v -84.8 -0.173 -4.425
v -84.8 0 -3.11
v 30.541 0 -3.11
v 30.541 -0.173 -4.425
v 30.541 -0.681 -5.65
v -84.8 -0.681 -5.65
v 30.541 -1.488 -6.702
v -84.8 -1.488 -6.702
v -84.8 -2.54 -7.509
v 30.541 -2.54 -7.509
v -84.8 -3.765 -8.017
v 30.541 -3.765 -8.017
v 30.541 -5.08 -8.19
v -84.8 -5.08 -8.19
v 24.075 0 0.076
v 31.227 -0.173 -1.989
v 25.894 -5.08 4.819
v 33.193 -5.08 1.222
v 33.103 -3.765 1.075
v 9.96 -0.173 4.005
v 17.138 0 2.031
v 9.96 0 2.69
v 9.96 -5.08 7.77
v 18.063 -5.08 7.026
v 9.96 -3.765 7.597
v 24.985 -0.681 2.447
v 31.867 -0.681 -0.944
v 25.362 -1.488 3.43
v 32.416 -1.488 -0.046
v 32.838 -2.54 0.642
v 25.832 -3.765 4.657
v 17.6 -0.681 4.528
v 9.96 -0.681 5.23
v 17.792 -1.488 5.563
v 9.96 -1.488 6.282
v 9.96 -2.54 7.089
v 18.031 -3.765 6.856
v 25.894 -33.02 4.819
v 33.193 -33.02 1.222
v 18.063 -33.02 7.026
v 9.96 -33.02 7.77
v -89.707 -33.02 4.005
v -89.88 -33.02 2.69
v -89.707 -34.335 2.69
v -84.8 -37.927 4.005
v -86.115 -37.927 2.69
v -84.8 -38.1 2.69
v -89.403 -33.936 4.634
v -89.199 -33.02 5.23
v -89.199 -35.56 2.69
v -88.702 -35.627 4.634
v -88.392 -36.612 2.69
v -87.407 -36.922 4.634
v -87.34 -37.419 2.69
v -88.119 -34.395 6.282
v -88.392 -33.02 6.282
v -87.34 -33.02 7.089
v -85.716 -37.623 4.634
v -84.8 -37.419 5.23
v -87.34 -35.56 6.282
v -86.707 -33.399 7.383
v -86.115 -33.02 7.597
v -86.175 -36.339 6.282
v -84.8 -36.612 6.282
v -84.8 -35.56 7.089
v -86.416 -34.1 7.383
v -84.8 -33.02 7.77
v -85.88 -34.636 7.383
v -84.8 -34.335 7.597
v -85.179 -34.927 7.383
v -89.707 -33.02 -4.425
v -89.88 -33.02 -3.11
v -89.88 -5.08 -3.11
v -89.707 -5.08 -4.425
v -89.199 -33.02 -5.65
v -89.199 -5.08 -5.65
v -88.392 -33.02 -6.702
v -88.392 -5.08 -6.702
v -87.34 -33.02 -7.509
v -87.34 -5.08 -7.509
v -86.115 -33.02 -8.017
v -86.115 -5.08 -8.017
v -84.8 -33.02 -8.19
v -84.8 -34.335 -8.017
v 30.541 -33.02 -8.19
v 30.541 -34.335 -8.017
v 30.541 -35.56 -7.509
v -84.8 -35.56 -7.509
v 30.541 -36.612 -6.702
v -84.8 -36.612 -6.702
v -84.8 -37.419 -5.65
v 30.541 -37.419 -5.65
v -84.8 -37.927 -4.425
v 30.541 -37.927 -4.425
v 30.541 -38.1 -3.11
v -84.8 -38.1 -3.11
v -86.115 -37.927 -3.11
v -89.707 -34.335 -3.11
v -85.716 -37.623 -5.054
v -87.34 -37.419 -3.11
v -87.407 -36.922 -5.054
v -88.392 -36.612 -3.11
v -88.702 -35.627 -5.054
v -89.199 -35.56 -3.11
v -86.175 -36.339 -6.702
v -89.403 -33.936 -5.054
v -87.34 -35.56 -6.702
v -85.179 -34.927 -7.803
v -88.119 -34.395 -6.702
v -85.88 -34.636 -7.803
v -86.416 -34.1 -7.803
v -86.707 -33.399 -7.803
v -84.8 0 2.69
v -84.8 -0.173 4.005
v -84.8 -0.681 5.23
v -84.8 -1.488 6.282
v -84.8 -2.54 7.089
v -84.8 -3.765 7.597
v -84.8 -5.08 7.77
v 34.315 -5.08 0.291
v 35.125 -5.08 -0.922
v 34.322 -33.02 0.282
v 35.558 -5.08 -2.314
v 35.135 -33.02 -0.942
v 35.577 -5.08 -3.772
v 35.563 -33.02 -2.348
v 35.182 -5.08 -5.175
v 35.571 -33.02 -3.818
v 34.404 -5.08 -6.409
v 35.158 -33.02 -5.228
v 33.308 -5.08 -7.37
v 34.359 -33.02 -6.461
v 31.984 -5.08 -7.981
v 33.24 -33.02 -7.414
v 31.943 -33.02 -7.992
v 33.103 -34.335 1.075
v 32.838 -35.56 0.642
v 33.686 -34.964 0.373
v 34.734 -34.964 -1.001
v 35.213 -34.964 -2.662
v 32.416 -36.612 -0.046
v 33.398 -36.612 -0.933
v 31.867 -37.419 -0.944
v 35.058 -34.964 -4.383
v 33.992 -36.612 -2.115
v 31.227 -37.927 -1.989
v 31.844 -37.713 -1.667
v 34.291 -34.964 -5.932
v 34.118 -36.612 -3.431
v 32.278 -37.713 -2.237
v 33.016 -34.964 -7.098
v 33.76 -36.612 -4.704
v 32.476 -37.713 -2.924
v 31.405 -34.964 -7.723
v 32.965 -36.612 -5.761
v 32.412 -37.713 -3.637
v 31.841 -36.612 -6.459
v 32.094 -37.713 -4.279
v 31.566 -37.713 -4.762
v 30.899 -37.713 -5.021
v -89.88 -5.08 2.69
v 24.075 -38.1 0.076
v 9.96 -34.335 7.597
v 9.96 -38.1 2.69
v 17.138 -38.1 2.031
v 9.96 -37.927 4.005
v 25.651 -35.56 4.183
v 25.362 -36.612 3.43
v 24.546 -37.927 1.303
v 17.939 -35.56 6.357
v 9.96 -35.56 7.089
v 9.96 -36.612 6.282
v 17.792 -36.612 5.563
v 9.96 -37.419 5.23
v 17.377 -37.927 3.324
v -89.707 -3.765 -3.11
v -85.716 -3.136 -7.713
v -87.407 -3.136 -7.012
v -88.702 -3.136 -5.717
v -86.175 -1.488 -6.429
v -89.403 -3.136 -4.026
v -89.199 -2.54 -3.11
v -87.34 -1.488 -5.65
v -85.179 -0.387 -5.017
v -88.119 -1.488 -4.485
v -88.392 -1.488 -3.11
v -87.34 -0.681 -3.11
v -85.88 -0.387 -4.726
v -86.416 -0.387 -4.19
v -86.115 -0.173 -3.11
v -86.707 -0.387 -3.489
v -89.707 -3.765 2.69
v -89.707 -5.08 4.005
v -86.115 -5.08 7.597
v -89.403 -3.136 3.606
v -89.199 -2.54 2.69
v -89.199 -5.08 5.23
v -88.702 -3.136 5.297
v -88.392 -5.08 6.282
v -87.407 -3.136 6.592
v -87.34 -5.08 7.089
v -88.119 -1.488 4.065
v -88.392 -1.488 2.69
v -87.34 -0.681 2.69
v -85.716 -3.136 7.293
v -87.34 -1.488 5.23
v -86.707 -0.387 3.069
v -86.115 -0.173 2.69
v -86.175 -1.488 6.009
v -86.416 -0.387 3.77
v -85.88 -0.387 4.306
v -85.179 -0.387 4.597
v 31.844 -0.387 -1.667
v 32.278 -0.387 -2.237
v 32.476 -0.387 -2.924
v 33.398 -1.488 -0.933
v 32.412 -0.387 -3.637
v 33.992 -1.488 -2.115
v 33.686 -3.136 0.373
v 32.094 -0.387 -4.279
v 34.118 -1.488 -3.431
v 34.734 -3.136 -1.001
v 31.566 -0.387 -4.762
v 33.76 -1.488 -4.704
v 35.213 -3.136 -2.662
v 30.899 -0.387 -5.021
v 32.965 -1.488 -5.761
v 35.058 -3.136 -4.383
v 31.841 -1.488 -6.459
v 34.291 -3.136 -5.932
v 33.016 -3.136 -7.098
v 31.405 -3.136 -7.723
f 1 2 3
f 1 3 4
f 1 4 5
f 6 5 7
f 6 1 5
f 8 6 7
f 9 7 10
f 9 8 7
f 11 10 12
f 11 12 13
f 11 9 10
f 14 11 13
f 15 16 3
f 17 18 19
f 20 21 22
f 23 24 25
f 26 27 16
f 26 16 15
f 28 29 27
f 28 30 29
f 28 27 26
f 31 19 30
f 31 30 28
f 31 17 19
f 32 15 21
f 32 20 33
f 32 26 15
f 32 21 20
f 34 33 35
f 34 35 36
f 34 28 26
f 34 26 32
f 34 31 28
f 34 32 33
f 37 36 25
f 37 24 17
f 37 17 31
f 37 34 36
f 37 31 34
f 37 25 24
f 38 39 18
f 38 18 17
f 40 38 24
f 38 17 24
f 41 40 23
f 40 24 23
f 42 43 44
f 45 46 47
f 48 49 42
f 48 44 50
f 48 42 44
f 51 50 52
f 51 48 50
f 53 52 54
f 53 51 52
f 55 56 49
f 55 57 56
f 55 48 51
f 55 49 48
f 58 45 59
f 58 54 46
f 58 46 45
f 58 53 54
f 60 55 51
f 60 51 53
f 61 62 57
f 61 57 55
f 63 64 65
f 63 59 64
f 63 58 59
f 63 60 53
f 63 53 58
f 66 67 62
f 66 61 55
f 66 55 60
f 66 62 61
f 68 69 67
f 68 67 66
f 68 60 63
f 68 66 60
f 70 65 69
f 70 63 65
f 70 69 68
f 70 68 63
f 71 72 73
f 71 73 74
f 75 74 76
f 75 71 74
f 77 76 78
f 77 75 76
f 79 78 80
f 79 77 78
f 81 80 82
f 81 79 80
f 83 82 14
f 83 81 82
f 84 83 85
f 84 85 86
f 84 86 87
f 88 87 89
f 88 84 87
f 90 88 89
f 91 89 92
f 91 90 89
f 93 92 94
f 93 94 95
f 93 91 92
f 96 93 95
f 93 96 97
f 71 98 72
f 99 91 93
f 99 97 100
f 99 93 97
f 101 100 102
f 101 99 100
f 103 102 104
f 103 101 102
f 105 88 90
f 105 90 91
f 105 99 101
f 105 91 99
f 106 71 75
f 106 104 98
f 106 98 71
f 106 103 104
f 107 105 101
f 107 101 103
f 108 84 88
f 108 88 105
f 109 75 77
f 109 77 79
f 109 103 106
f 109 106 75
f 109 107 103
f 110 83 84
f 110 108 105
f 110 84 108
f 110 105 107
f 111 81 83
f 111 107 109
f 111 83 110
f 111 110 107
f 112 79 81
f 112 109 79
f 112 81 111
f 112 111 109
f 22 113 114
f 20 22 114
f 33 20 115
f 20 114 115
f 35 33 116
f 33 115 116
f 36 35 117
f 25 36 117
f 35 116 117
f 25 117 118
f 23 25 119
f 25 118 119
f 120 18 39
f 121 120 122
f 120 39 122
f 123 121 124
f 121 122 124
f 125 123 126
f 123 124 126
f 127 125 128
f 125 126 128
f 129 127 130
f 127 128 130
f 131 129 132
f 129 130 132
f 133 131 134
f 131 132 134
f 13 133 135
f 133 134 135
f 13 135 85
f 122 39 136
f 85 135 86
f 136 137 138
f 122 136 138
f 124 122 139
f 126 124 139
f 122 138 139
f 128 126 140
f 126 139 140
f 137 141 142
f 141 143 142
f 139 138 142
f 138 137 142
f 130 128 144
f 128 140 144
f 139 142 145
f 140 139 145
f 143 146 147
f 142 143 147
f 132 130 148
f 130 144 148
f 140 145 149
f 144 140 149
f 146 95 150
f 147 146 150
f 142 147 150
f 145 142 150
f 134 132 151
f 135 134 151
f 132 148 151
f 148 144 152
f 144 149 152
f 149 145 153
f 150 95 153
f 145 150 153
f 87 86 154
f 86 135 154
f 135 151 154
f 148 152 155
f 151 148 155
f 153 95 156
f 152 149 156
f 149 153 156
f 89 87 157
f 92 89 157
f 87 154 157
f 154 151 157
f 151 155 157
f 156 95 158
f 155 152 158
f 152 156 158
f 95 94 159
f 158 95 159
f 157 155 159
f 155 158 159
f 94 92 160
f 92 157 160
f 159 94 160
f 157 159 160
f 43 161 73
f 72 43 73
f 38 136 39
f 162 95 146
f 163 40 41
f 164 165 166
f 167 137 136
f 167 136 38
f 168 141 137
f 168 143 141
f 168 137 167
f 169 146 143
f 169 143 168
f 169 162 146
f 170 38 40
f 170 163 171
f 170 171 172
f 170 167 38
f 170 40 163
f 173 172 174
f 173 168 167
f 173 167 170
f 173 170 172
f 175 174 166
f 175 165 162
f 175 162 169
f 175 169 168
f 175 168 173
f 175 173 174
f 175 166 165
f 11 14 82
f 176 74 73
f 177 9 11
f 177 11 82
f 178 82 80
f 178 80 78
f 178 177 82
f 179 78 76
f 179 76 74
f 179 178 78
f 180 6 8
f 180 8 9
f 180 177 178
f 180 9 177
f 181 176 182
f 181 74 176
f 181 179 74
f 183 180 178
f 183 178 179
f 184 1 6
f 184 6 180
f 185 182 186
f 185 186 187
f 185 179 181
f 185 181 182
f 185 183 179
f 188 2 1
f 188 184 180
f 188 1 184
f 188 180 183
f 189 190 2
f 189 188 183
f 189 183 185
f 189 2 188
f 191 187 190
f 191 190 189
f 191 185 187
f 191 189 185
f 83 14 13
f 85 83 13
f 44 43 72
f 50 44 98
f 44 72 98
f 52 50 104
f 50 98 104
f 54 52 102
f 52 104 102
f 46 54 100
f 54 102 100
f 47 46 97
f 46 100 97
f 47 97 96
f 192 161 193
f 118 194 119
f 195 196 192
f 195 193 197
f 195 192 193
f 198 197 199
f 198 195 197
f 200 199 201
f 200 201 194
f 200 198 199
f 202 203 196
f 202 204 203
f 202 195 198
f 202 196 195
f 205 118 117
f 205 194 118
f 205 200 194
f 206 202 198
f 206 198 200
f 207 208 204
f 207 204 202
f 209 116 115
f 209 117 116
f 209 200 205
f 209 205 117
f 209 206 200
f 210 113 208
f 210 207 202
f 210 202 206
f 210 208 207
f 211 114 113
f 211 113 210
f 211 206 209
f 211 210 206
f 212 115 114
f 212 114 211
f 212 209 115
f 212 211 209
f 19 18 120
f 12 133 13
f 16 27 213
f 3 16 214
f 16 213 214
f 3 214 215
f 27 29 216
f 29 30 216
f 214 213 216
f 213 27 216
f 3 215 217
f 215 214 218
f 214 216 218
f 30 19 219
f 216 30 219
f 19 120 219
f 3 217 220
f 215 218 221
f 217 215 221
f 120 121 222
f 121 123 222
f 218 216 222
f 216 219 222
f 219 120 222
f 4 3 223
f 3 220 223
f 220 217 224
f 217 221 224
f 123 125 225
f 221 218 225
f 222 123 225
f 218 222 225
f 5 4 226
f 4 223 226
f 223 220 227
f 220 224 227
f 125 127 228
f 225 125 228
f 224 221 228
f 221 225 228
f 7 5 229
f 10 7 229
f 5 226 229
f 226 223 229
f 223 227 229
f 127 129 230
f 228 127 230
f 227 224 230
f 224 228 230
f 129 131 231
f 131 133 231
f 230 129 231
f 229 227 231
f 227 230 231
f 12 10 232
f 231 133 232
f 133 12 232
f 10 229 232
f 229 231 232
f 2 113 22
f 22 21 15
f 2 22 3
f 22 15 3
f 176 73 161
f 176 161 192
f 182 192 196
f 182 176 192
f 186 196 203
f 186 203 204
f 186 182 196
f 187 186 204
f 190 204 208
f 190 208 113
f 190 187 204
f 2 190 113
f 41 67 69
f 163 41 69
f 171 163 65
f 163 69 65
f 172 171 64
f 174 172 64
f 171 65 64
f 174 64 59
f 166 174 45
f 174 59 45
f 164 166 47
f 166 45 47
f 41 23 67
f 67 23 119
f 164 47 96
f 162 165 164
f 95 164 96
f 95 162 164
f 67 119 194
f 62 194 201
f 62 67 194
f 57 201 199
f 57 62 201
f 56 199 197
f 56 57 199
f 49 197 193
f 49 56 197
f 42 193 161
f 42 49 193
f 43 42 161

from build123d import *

# Parameters (mm, degrees)
F1_DEPTH     = 38.1
F2_R         = 5.08
F3_F1_R      = 5.08
F3_T2_DEPTH  = 94.7599984092
F3_T4_DEPTH  = 115.3407412507
F3_S8_W      = 5.1816
F3_S8_H      = 5.1816
F3_T9_DEPTH  = 5.1816
F3_S14_W     = 5.1816
F3_S14_H     = 5.1816
F3_T15_DEPTH = 5.1816
F3_T19_ANGLE = 31.4774656297
F3_T21_ANGLE = 148.5225343703
F3_T22_DEPTH = 94.7599984092
F3_T24_DEPTH = 115.3407412507
F3_S28_W     = 5.1816
F3_S28_H     = 5.1816
F3_T29_DEPTH = 5.1816
F3_S34_W     = 5.1816
F3_S34_H     = 5.1816
F3_T35_DEPTH = 5.1816
F3_T39_ANGLE = 31.4774656297
F3_T41_ANGLE = 148.5225343703


# Not quite as in the source:
# - a fillet or chamfer that OpenCascade refuses, or shapes differently, is made with other operations: its cross-section is extruded or revolved along the edge and cut away or added


with BuildPart() as f1:
    # F0 (on Front) → F1 (new body)
    with BuildSketch(Plane.XZ):
        with BuildLine():
            Line((9.9600013345, 7.7700004913), (-89.8799970746, 7.7700004913))
            Line((-89.8799970746, 7.7700004913), (-89.8799970746, -8.1900004297))
            Line((-89.8799970746, -8.1900004297), (44.0999977291, -8.1900004297))
            ThreePointArc((44.0999977291, -8.1900004297), (28.8031763803, 3.5829980082), (9.9600013345, 7.7700004913))
        make_face()
    extrude(amount=F1_DEPTH)

    # F2
    f2_edges = [f1.edges().sort_by_distance(p)[0] for p in [
        (-89.879997, -19.05, -8.19),
        (-89.879997, 0, -0.21),
        (-89.879997, -19.05, 7.77),
        (-89.879997, -38.1, -0.21),
    ]]
    fillet(f2_edges, radius=F2_R)

    # F3: fillet of radius 5.08 on 12 edges, made by hand

    # F3_f1
    f3_f1_edges = [f1.edges().sort_by_distance(p)[0] for p in [
        (44.0999977291, -19.05, -8.1900004297),
    ]]
    fillet(f3_f1_edges, radius=F3_F1_R)

    # F3_s3 → F3_t2 (cut)
    with BuildSketch(Plane.YZ.offset(-84.7999970746)):
        with BuildLine():
            ThreePointArc((0, 2.6900004913), (-1.4878975516, 6.2821029397), (-5.08, 7.7700004913))
            Line((-5.08, 7.7700004913), (-5.08, 7.8716004913))
            Line((-5.08, 7.8716004913), (0.1016, 7.8716004913))
            Line((0.1016, 7.8716004913), (0.1016, 2.6900004913))
            Line((0.1016, 2.6900004913), (0, 2.6900004913))
        make_face()
    extrude(amount=F3_T2_DEPTH, mode=Mode.SUBTRACT)

    # F3_s5 → F3_t4 (cut)
    with BuildSketch(Plane.YZ.offset(-84.7999970746)):
        with BuildLine():
            ThreePointArc((0, -3.1100004297), (-1.4878975516, -6.7021028782), (-5.08, -8.1900004297))
            Line((-5.08, -8.1900004297), (-5.08, -8.2916004297))
            Line((-5.08, -8.2916004297), (0.1016, -8.2916004297))
            Line((0.1016, -8.2916004297), (0.1016, -3.1100004297))
            Line((0.1016, -3.1100004297), (0, -3.1100004297))
        make_face()
    extrude(amount=F3_T4_DEPTH, mode=Mode.SUBTRACT)


with BuildPart() as f3_tool7:
    # F3_s8 → F3_t9 (new body)
    with BuildSketch(Plane.XZ.offset(5.08)):
        with Locations((-87.3907970746, 5.2808004913)):
            Rectangle(F3_S8_W, F3_S8_H)
    extrude(amount=-F3_T9_DEPTH)

    # F3_s10 → F3_t11 (revolve, cut)
    with BuildSketch(Plane(origin=(-84.7999970746, -5.08, 2.6900004913), x_dir=(0.7071067812, 0, -0.7071067812), z_dir=(0.7071067812, 0, 0.7071067812))):
        with BuildLine():
            ThreePointArc((0, -5.08), (5.08, 0), (0, 5.08))
            Line((0, 5.08), (0, -5.08))
        make_face()
    revolve(axis=Axis((-84.7999970746, -5.08, 2.6900004913), (0, 1, 0)), mode=Mode.SUBTRACT)


with BuildPart() as f1_1:
    add(f1.part)

    # F3_t6: cut F3_tool7
    add(f3_tool7.part, mode=Mode.SUBTRACT)


with BuildPart() as f3_tool13:
    # F3_s14 → F3_t15 (new body)
    with BuildSketch(Plane.XZ.offset(5.08)):
        with Locations((-87.3907970746, -5.7008004297)):
            Rectangle(F3_S14_W, F3_S14_H)
    extrude(amount=-F3_T15_DEPTH)

    # F3_s16 → F3_t17 (revolve, cut)
    with BuildSketch(Plane(origin=(-84.7999970746, -5.08, -3.1100004297), x_dir=(0.7071067812, 0, 0.7071067812), z_dir=(-0.7071067812, 0, 0.7071067812))):
        with BuildLine():
            ThreePointArc((0, -5.08), (5.08, 0), (0, 5.08))
            Line((0, 5.08), (0, -5.08))
        make_face()
    revolve(axis=Axis((-84.7999970746, -5.08, -3.1100004297), (0, 1, 0)), mode=Mode.SUBTRACT)


with BuildPart() as f1_2:
    add(f1_1.part)

    # F3_t12: cut F3_tool13
    add(f3_tool13.part, mode=Mode.SUBTRACT)

    # F3_s18 → F3_t19 (revolve, cut)
    with BuildSketch(Plane(origin=(23.5986358548, 0, -14.4484990421), x_dir=(0, 1, 0), z_dir=(0.8528455965, 0, -0.5221631818))):
        with BuildLine():
            ThreePointArc((0, 13.2949019826), (-1.4878975516, 16.887004431), (-5.08, 18.3749019826))
            Line((-5.08, 18.3749019826), (-5.08, 18.4765019826))
            Line((-5.08, 18.4765019826), (0.1016, 18.4765019826))
            Line((0.1016, 18.4765019826), (0.1016, 13.2949019826))
            Line((0.1016, 13.2949019826), (0, 13.2949019826))
        make_face()
    revolve(axis=Axis((9.9600013345, 0, -36.7243886458), (0, -1, 0)), revolution_arc=F3_T19_ANGLE, mode=Mode.SUBTRACT)

    # F3_s20 → F3_t21 (revolve, cut)
    with BuildSketch(Plane(origin=(23.5986358548, 0, -14.4484990421), x_dir=(0, 1, 0), z_dir=(-0.8528455965, 0, 0.5221631818))):
        with BuildLine():
            ThreePointArc((0, -13.2949019826), (-1.4878975516, -16.887004431), (-5.08, -18.3749019826))
            Line((-5.08, -18.3749019826), (-5.08, -18.4765019826))
            Line((-5.08, -18.4765019826), (0.1016, -18.4765019826))
            Line((0.1016, -18.4765019826), (0.1016, -13.2949019826))
            Line((0.1016, -13.2949019826), (0, -13.2949019826))
        make_face()
    revolve(axis=Axis((30.5407441761, 0, -3.1100004297), (0, 1, 0)), revolution_arc=F3_T21_ANGLE, mode=Mode.SUBTRACT)

    # F3_s23 → F3_t22 (cut)
    with BuildSketch(Plane.YZ.offset(-84.7999970746)):
        with BuildLine():
            ThreePointArc((-33.02, 7.7700004913), (-36.6121024484, 6.2821029397), (-38.1, 2.6900004913))
            Line((-38.1, 2.6900004913), (-38.2016, 2.6900004913))
            Line((-38.2016, 2.6900004913), (-38.2016, 7.8716004913))
            Line((-38.2016, 7.8716004913), (-33.02, 7.8716004913))
            Line((-33.02, 7.8716004913), (-33.02, 7.7700004913))
        make_face()
    extrude(amount=F3_T22_DEPTH, mode=Mode.SUBTRACT)

    # F3_s25 → F3_t24 (cut)
    with BuildSketch(Plane.YZ.offset(-84.7999970746)):
        with BuildLine():
            ThreePointArc((-33.02, -8.1900004297), (-36.6121024484, -6.7021028782), (-38.1, -3.1100004297))
            Line((-38.1, -3.1100004297), (-38.2016, -3.1100004297))
            Line((-38.2016, -3.1100004297), (-38.2016, -8.2916004297))
            Line((-38.2016, -8.2916004297), (-33.02, -8.2916004297))
            Line((-33.02, -8.2916004297), (-33.02, -8.1900004297))
        make_face()
    extrude(amount=F3_T24_DEPTH, mode=Mode.SUBTRACT)


with BuildPart() as f3_tool27:
    # F3_s28 → F3_t29 (new body)
    with BuildSketch(Plane.XY.offset(2.6900004913)):
        with Locations((-87.3907970746, -35.6108)):
            Rectangle(F3_S28_W, F3_S28_H)
    extrude(amount=F3_T29_DEPTH)

    # F3_s30 → F3_t31 (revolve, cut)
    with BuildSketch(Plane(origin=(-84.7999970746, -33.02, 2.6900004913), x_dir=(0.7071067812, 0.7071067812, 0), z_dir=(0.7071067812, -0.7071067812, 0))):
        with BuildLine():
            ThreePointArc((0, -5.08), (5.08, 0), (0, 5.08))
            Line((0, 5.08), (0, -5.08))
        make_face()
    revolve(axis=Axis((-84.7999970746, -33.02, 2.6900004913), (0, 0, 1)), mode=Mode.SUBTRACT)


with BuildPart() as f1_3:
    add(f1_2.part)

    # F3_t26: cut F3_tool27
    add(f3_tool27.part, mode=Mode.SUBTRACT)


with BuildPart() as f3_tool33:
    # F3_s34 → F3_t35 (new body)
    with BuildSketch(Plane.XY.offset(-3.1100004297)):
        with Locations((-87.3907970746, -35.6108)):
            Rectangle(F3_S34_W, F3_S34_H)
    extrude(amount=-F3_T35_DEPTH)

    # F3_s36 → F3_t37 (revolve, cut)
    with BuildSketch(Plane(origin=(-84.7999970746, -33.02, -3.1100004297), x_dir=(0.7071067812, 0.7071067812, 0), z_dir=(-0.7071067812, 0.7071067812, 0))):
        with BuildLine():
            ThreePointArc((0, -5.08), (5.08, 0), (0, 5.08))
            Line((0, 5.08), (0, -5.08))
        make_face()
    revolve(axis=Axis((-84.7999970746, -33.02, -3.1100004297), (0, 0, -1)), mode=Mode.SUBTRACT)


with BuildPart() as f1_4:
    add(f1_3.part)

    # F3_t32: cut F3_tool33
    add(f3_tool33.part, mode=Mode.SUBTRACT)

    # F3_s38 → F3_t39 (revolve, cut)
    with BuildSketch(Plane(origin=(23.5986358548, 0, -14.4484990421), x_dir=(0, 1, 0), z_dir=(0.8528455965, 0, -0.5221631818))):
        with BuildLine():
            ThreePointArc((-33.02, 18.3749019826), (-36.6121024484, 16.887004431), (-38.1, 13.2949019826))
            Line((-38.1, 13.2949019826), (-38.2016, 13.2949019826))
            Line((-38.2016, 13.2949019826), (-38.2016, 18.4765019826))
            Line((-38.2016, 18.4765019826), (-33.02, 18.4765019826))
            Line((-33.02, 18.4765019826), (-33.02, 18.3749019826))
        make_face()
    revolve(axis=Axis((9.9600013345, -38.1, -36.7243886458), (0, -1, 0)), revolution_arc=F3_T39_ANGLE, mode=Mode.SUBTRACT)

    # F3_s40 → F3_t41 (revolve, cut)
    with BuildSketch(Plane(origin=(23.5986358548, 0, -14.4484990421), x_dir=(0, 1, 0), z_dir=(-0.8528455965, 0, 0.5221631818))):
        with BuildLine():
            ThreePointArc((-33.02, -18.3749019826), (-36.6121024484, -16.887004431), (-38.1, -13.2949019826))
            Line((-38.1, -13.2949019826), (-38.2016, -13.2949019826))
            Line((-38.2016, -13.2949019826), (-38.2016, -18.4765019826))
            Line((-38.2016, -18.4765019826), (-33.02, -18.4765019826))
            Line((-33.02, -18.4765019826), (-33.02, -18.3749019826))
        make_face()
    revolve(axis=Axis((30.5407441761, -38.1, -3.1100004297), (0, 1, 0)), revolution_arc=F3_T41_ANGLE, mode=Mode.SUBTRACT)


solid = f1_4.part
